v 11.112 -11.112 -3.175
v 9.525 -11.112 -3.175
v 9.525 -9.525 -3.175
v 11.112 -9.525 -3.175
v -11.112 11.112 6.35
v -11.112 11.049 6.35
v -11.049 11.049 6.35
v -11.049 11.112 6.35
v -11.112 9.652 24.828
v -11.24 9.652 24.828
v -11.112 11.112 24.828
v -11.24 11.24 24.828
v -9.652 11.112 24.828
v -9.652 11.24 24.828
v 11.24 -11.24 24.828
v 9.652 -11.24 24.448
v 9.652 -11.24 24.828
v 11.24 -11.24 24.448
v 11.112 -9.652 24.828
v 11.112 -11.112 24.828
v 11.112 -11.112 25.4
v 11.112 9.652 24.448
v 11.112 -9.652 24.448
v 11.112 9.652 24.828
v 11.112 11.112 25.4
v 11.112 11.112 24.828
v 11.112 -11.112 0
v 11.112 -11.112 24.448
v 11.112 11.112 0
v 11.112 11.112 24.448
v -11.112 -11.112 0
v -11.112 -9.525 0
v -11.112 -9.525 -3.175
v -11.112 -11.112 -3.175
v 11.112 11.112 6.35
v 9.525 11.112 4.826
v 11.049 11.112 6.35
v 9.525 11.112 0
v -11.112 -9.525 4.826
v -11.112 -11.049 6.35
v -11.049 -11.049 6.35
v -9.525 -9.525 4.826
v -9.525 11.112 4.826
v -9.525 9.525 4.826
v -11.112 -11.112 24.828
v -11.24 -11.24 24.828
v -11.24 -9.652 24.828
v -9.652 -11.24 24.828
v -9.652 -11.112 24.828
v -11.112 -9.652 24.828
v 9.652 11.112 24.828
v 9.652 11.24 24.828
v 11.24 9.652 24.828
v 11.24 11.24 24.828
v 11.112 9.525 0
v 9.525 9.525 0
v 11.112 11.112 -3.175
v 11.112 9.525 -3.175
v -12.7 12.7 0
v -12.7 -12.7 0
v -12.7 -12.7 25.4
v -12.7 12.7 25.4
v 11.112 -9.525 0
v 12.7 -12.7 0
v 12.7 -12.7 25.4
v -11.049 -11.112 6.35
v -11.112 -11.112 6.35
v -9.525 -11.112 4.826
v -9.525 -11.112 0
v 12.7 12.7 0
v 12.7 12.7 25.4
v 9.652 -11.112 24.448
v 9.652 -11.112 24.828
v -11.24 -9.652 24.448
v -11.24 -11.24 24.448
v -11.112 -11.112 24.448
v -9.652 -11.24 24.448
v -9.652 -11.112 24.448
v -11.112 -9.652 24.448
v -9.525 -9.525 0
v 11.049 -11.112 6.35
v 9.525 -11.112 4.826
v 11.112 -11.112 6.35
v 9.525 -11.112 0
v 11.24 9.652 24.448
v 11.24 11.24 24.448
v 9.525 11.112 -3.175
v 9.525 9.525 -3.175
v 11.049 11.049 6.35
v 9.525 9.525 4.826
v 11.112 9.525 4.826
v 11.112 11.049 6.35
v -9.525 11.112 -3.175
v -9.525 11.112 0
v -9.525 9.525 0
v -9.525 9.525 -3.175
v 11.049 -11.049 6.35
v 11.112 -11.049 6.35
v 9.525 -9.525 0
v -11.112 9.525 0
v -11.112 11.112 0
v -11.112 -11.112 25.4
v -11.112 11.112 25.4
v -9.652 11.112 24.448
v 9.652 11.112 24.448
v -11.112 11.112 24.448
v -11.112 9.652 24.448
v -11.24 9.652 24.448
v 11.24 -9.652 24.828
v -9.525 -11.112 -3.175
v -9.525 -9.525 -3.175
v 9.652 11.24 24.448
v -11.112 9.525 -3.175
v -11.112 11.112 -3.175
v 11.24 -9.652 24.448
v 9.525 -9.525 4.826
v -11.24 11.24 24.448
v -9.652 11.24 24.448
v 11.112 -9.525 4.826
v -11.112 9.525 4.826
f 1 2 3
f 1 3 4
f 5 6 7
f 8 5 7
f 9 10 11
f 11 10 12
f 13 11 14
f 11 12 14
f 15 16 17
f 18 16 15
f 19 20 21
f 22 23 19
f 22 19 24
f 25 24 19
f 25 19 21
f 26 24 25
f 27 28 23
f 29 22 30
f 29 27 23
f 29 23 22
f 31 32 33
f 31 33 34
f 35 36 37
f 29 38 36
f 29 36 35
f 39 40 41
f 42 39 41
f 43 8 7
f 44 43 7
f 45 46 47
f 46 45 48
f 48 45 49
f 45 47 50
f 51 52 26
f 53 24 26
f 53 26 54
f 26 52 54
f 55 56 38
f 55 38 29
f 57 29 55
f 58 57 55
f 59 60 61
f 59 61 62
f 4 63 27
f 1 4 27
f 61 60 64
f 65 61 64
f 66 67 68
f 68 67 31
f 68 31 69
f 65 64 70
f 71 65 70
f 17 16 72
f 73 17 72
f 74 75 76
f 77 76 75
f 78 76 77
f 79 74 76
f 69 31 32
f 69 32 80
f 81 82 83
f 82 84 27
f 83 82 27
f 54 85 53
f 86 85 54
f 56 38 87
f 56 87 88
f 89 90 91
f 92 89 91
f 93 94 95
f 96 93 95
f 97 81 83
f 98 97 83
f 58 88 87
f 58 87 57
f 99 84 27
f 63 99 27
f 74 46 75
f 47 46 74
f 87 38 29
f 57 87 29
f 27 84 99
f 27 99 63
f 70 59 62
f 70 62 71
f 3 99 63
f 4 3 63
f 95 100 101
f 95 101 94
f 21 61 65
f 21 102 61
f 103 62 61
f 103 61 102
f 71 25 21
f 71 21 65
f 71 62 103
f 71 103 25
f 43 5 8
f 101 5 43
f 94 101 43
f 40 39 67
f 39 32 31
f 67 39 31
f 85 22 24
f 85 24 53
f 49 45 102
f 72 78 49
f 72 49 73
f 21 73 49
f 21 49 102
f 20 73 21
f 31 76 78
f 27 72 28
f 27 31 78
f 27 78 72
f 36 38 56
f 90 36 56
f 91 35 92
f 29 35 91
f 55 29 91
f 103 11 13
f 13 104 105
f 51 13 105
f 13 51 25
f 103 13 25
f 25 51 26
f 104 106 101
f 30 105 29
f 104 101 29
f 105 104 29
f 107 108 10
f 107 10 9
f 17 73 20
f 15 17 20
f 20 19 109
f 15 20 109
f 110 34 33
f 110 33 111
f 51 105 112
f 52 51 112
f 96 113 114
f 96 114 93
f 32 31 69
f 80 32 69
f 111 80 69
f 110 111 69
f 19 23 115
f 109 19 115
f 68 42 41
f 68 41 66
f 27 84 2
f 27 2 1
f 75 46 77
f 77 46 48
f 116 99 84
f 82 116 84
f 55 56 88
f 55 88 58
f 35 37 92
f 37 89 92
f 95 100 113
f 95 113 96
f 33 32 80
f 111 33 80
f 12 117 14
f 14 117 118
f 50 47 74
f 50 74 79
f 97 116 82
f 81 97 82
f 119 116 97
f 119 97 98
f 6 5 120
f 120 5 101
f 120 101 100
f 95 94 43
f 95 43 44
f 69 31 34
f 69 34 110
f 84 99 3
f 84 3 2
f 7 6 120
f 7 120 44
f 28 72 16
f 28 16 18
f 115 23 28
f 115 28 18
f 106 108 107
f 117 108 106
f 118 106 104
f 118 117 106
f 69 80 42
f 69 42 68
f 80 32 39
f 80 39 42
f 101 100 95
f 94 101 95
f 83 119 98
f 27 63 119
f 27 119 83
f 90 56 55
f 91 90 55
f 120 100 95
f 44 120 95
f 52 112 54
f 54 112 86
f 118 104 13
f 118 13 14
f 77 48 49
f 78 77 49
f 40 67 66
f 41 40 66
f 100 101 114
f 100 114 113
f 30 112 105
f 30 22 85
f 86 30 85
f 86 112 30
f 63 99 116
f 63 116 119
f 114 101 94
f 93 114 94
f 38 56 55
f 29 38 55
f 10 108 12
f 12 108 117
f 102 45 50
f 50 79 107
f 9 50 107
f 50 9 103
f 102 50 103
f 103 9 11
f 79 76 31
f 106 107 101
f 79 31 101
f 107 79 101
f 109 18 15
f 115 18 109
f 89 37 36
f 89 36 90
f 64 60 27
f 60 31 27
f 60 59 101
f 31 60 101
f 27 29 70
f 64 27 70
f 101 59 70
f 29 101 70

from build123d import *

# Parameters (mm, degrees)
F0_W      = 25.4
F0_H      = 25.4
F0_W_2    = 22.225
F0_H_2    = 22.225
F1_DEPTH  = 25.4
F2_W      = 1.5875
F2_H      = 1.5875
F3_DEPTH  = 3.175
F4_DEPTH  = 6.35
F5_SIZE   = 1.524
F5_2_SIZE = 1.524
F5_3_SIZE = 1.524
F5_4_SIZE = 1.524
F7_W      = 1.5875
F7_H      = 1.5875
F8_DEPTH  = 0.0635
F9_DEPTH  = 0.1905


with BuildPart() as f1:
    # F0 (on Top) → F1 (new body)
    with BuildSketch(Plane.XY):
        Rectangle(F0_W, F0_H)
        Rectangle(F0_W_2, F0_H_2, mode=Mode.SUBTRACT)
    extrude(amount=F1_DEPTH)

    # F7 (on offset) → F8 (cut, symmetric)
    with BuildSketch(Plane.XY.offset(24.638)):
        with Locations((-10.44575, 10.44575)):
            Rectangle(F7_W, F7_H)
    extrude(amount=F8_DEPTH, both=True, mode=Mode.SUBTRACT)

    # F7 (on offset) → F9 (cut, symmetric)
    with BuildSketch(Plane.XY.offset(24.638)):
        with Locations((-10.44575, 10.44575)):
            Rectangle(F7_W, F7_H)
        with Locations((10.44575, 10.44575)):
            Rectangle(F7_W, F7_H)
        with Locations((10.44575, -10.44575)):
            Rectangle(F7_W, F7_H)
        with Locations((-10.44575, -10.44575)):
            Rectangle(F7_W, F7_H)
    extrude(amount=F9_DEPTH, both=True, mode=Mode.SUBTRACT)


with BuildPart() as f3:
    # F2 (on face) → F3 (new body)
    with BuildSketch(Plane(origin=(0, 0, 0), x_dir=(1, 0, 0), z_dir=(0, 0, -1))):
        with Locations((-10.31875, -10.31875)):
            Rectangle(F2_W, F2_H)
    extrude(amount=F3_DEPTH)


with BuildPart() as f3b:
    # F2 (on face) → F3, piece 2 (new body)
    with BuildSketch(Plane(origin=(0, 0, 0), x_dir=(1, 0, 0), z_dir=(0, 0, -1))):
        with Locations((10.31875, -10.31875)):
            Rectangle(F2_W, F2_H)
    extrude(amount=F3_DEPTH)


with BuildPart() as f3c:
    # F2 (on face) → F3, piece 3 (new body)
    with BuildSketch(Plane(origin=(0, 0, 0), x_dir=(1, 0, 0), z_dir=(0, 0, -1))):
        with Locations((10.31875, 10.31875)):
            Rectangle(F2_W, F2_H)
    extrude(amount=F3_DEPTH)


with BuildPart() as f3d:
    # F2 (on face) → F3, piece 4 (new body)
    with BuildSketch(Plane(origin=(0, 0, 0), x_dir=(1, 0, 0), z_dir=(0, 0, -1))):
        with Locations((-10.31875, 10.31875)):
            Rectangle(F2_W, F2_H)
    extrude(amount=F3_DEPTH)


with BuildPart() as f4:
    # F4 (new): faces of the model
    f4_faces = [f3.part.faces().sort_by_distance(p)[0] for p in [
        (-10.31875, 10.31875, 0),
        (-10.31875, 10.31875, 0),
        (-10.31875, 10.31875, 0),
        (-10.31875, 10.31875, 0),
    ]]
    extrude(f4_faces, amount=F4_DEPTH)

    # F5#3
    f5_3_edges = [f4.edges().sort_by_distance(p)[0] for p in [
        (-10.31875, 9.525, 6.35),
        (-9.525, 10.31875, 6.35),
    ]]
    chamfer(f5_3_edges, length=F5_3_SIZE)


with BuildPart() as f4b:
    # F4#2 (new): faces of the model
    f4_2_faces = [f3b.part.faces().sort_by_distance(p)[0] for p in [
        (10.31875, 10.31875, 0),
        (10.31875, 10.31875, 0),
        (10.31875, 10.31875, 0),
        (10.31875, 10.31875, 0),
    ]]
    extrude(f4_2_faces, amount=F4_DEPTH)

    # F5#2
    f5_2_edges = [f4b.edges().sort_by_distance(p)[0] for p in [
        (10.31875, 9.525, 6.35),
        (9.525, 10.31875, 6.35),
    ]]
    chamfer(f5_2_edges, length=F5_2_SIZE)


with BuildPart() as f4c:
    # F4#3 (new): faces of the model
    f4_3_faces = [f3c.part.faces().sort_by_distance(p)[0] for p in [
        (10.31875, -10.31875, 0),
        (10.31875, -10.31875, 0),
        (10.31875, -10.31875, 0),
        (10.31875, -10.31875, 0),
    ]]
    extrude(f4_3_faces, amount=F4_DEPTH)

    # F5
    f5_edges = [f4c.edges().sort_by_distance(p)[0] for p in [
        (10.31875, -9.525, 6.35),
        (9.525, -10.31875, 6.35),
    ]]
    chamfer(f5_edges, length=F5_SIZE)


with BuildPart() as f4d:
    # F4#4 (new): faces of the model
    f4_4_faces = [f3d.part.faces().sort_by_distance(p)[0] for p in [
        (-10.31875, -10.31875, 0),
        (-10.31875, -10.31875, 0),
        (-10.31875, -10.31875, 0),
        (-10.31875, -10.31875, 0),
    ]]
    extrude(f4_4_faces, amount=F4_DEPTH)

    # F5#4
    f5_4_edges = [f4d.edges().sort_by_distance(p)[0] for p in [
        (-9.525, -10.31875, 6.35),
        (-10.31875, -9.525, 6.35),
    ]]
    chamfer(f5_4_edges, length=F5_4_SIZE)


solid = Compound([f1.part, f3.part, f3b.part, f3c.part, f3d.part, f4.part, f4b.part, f4c.part, f4d.part])
